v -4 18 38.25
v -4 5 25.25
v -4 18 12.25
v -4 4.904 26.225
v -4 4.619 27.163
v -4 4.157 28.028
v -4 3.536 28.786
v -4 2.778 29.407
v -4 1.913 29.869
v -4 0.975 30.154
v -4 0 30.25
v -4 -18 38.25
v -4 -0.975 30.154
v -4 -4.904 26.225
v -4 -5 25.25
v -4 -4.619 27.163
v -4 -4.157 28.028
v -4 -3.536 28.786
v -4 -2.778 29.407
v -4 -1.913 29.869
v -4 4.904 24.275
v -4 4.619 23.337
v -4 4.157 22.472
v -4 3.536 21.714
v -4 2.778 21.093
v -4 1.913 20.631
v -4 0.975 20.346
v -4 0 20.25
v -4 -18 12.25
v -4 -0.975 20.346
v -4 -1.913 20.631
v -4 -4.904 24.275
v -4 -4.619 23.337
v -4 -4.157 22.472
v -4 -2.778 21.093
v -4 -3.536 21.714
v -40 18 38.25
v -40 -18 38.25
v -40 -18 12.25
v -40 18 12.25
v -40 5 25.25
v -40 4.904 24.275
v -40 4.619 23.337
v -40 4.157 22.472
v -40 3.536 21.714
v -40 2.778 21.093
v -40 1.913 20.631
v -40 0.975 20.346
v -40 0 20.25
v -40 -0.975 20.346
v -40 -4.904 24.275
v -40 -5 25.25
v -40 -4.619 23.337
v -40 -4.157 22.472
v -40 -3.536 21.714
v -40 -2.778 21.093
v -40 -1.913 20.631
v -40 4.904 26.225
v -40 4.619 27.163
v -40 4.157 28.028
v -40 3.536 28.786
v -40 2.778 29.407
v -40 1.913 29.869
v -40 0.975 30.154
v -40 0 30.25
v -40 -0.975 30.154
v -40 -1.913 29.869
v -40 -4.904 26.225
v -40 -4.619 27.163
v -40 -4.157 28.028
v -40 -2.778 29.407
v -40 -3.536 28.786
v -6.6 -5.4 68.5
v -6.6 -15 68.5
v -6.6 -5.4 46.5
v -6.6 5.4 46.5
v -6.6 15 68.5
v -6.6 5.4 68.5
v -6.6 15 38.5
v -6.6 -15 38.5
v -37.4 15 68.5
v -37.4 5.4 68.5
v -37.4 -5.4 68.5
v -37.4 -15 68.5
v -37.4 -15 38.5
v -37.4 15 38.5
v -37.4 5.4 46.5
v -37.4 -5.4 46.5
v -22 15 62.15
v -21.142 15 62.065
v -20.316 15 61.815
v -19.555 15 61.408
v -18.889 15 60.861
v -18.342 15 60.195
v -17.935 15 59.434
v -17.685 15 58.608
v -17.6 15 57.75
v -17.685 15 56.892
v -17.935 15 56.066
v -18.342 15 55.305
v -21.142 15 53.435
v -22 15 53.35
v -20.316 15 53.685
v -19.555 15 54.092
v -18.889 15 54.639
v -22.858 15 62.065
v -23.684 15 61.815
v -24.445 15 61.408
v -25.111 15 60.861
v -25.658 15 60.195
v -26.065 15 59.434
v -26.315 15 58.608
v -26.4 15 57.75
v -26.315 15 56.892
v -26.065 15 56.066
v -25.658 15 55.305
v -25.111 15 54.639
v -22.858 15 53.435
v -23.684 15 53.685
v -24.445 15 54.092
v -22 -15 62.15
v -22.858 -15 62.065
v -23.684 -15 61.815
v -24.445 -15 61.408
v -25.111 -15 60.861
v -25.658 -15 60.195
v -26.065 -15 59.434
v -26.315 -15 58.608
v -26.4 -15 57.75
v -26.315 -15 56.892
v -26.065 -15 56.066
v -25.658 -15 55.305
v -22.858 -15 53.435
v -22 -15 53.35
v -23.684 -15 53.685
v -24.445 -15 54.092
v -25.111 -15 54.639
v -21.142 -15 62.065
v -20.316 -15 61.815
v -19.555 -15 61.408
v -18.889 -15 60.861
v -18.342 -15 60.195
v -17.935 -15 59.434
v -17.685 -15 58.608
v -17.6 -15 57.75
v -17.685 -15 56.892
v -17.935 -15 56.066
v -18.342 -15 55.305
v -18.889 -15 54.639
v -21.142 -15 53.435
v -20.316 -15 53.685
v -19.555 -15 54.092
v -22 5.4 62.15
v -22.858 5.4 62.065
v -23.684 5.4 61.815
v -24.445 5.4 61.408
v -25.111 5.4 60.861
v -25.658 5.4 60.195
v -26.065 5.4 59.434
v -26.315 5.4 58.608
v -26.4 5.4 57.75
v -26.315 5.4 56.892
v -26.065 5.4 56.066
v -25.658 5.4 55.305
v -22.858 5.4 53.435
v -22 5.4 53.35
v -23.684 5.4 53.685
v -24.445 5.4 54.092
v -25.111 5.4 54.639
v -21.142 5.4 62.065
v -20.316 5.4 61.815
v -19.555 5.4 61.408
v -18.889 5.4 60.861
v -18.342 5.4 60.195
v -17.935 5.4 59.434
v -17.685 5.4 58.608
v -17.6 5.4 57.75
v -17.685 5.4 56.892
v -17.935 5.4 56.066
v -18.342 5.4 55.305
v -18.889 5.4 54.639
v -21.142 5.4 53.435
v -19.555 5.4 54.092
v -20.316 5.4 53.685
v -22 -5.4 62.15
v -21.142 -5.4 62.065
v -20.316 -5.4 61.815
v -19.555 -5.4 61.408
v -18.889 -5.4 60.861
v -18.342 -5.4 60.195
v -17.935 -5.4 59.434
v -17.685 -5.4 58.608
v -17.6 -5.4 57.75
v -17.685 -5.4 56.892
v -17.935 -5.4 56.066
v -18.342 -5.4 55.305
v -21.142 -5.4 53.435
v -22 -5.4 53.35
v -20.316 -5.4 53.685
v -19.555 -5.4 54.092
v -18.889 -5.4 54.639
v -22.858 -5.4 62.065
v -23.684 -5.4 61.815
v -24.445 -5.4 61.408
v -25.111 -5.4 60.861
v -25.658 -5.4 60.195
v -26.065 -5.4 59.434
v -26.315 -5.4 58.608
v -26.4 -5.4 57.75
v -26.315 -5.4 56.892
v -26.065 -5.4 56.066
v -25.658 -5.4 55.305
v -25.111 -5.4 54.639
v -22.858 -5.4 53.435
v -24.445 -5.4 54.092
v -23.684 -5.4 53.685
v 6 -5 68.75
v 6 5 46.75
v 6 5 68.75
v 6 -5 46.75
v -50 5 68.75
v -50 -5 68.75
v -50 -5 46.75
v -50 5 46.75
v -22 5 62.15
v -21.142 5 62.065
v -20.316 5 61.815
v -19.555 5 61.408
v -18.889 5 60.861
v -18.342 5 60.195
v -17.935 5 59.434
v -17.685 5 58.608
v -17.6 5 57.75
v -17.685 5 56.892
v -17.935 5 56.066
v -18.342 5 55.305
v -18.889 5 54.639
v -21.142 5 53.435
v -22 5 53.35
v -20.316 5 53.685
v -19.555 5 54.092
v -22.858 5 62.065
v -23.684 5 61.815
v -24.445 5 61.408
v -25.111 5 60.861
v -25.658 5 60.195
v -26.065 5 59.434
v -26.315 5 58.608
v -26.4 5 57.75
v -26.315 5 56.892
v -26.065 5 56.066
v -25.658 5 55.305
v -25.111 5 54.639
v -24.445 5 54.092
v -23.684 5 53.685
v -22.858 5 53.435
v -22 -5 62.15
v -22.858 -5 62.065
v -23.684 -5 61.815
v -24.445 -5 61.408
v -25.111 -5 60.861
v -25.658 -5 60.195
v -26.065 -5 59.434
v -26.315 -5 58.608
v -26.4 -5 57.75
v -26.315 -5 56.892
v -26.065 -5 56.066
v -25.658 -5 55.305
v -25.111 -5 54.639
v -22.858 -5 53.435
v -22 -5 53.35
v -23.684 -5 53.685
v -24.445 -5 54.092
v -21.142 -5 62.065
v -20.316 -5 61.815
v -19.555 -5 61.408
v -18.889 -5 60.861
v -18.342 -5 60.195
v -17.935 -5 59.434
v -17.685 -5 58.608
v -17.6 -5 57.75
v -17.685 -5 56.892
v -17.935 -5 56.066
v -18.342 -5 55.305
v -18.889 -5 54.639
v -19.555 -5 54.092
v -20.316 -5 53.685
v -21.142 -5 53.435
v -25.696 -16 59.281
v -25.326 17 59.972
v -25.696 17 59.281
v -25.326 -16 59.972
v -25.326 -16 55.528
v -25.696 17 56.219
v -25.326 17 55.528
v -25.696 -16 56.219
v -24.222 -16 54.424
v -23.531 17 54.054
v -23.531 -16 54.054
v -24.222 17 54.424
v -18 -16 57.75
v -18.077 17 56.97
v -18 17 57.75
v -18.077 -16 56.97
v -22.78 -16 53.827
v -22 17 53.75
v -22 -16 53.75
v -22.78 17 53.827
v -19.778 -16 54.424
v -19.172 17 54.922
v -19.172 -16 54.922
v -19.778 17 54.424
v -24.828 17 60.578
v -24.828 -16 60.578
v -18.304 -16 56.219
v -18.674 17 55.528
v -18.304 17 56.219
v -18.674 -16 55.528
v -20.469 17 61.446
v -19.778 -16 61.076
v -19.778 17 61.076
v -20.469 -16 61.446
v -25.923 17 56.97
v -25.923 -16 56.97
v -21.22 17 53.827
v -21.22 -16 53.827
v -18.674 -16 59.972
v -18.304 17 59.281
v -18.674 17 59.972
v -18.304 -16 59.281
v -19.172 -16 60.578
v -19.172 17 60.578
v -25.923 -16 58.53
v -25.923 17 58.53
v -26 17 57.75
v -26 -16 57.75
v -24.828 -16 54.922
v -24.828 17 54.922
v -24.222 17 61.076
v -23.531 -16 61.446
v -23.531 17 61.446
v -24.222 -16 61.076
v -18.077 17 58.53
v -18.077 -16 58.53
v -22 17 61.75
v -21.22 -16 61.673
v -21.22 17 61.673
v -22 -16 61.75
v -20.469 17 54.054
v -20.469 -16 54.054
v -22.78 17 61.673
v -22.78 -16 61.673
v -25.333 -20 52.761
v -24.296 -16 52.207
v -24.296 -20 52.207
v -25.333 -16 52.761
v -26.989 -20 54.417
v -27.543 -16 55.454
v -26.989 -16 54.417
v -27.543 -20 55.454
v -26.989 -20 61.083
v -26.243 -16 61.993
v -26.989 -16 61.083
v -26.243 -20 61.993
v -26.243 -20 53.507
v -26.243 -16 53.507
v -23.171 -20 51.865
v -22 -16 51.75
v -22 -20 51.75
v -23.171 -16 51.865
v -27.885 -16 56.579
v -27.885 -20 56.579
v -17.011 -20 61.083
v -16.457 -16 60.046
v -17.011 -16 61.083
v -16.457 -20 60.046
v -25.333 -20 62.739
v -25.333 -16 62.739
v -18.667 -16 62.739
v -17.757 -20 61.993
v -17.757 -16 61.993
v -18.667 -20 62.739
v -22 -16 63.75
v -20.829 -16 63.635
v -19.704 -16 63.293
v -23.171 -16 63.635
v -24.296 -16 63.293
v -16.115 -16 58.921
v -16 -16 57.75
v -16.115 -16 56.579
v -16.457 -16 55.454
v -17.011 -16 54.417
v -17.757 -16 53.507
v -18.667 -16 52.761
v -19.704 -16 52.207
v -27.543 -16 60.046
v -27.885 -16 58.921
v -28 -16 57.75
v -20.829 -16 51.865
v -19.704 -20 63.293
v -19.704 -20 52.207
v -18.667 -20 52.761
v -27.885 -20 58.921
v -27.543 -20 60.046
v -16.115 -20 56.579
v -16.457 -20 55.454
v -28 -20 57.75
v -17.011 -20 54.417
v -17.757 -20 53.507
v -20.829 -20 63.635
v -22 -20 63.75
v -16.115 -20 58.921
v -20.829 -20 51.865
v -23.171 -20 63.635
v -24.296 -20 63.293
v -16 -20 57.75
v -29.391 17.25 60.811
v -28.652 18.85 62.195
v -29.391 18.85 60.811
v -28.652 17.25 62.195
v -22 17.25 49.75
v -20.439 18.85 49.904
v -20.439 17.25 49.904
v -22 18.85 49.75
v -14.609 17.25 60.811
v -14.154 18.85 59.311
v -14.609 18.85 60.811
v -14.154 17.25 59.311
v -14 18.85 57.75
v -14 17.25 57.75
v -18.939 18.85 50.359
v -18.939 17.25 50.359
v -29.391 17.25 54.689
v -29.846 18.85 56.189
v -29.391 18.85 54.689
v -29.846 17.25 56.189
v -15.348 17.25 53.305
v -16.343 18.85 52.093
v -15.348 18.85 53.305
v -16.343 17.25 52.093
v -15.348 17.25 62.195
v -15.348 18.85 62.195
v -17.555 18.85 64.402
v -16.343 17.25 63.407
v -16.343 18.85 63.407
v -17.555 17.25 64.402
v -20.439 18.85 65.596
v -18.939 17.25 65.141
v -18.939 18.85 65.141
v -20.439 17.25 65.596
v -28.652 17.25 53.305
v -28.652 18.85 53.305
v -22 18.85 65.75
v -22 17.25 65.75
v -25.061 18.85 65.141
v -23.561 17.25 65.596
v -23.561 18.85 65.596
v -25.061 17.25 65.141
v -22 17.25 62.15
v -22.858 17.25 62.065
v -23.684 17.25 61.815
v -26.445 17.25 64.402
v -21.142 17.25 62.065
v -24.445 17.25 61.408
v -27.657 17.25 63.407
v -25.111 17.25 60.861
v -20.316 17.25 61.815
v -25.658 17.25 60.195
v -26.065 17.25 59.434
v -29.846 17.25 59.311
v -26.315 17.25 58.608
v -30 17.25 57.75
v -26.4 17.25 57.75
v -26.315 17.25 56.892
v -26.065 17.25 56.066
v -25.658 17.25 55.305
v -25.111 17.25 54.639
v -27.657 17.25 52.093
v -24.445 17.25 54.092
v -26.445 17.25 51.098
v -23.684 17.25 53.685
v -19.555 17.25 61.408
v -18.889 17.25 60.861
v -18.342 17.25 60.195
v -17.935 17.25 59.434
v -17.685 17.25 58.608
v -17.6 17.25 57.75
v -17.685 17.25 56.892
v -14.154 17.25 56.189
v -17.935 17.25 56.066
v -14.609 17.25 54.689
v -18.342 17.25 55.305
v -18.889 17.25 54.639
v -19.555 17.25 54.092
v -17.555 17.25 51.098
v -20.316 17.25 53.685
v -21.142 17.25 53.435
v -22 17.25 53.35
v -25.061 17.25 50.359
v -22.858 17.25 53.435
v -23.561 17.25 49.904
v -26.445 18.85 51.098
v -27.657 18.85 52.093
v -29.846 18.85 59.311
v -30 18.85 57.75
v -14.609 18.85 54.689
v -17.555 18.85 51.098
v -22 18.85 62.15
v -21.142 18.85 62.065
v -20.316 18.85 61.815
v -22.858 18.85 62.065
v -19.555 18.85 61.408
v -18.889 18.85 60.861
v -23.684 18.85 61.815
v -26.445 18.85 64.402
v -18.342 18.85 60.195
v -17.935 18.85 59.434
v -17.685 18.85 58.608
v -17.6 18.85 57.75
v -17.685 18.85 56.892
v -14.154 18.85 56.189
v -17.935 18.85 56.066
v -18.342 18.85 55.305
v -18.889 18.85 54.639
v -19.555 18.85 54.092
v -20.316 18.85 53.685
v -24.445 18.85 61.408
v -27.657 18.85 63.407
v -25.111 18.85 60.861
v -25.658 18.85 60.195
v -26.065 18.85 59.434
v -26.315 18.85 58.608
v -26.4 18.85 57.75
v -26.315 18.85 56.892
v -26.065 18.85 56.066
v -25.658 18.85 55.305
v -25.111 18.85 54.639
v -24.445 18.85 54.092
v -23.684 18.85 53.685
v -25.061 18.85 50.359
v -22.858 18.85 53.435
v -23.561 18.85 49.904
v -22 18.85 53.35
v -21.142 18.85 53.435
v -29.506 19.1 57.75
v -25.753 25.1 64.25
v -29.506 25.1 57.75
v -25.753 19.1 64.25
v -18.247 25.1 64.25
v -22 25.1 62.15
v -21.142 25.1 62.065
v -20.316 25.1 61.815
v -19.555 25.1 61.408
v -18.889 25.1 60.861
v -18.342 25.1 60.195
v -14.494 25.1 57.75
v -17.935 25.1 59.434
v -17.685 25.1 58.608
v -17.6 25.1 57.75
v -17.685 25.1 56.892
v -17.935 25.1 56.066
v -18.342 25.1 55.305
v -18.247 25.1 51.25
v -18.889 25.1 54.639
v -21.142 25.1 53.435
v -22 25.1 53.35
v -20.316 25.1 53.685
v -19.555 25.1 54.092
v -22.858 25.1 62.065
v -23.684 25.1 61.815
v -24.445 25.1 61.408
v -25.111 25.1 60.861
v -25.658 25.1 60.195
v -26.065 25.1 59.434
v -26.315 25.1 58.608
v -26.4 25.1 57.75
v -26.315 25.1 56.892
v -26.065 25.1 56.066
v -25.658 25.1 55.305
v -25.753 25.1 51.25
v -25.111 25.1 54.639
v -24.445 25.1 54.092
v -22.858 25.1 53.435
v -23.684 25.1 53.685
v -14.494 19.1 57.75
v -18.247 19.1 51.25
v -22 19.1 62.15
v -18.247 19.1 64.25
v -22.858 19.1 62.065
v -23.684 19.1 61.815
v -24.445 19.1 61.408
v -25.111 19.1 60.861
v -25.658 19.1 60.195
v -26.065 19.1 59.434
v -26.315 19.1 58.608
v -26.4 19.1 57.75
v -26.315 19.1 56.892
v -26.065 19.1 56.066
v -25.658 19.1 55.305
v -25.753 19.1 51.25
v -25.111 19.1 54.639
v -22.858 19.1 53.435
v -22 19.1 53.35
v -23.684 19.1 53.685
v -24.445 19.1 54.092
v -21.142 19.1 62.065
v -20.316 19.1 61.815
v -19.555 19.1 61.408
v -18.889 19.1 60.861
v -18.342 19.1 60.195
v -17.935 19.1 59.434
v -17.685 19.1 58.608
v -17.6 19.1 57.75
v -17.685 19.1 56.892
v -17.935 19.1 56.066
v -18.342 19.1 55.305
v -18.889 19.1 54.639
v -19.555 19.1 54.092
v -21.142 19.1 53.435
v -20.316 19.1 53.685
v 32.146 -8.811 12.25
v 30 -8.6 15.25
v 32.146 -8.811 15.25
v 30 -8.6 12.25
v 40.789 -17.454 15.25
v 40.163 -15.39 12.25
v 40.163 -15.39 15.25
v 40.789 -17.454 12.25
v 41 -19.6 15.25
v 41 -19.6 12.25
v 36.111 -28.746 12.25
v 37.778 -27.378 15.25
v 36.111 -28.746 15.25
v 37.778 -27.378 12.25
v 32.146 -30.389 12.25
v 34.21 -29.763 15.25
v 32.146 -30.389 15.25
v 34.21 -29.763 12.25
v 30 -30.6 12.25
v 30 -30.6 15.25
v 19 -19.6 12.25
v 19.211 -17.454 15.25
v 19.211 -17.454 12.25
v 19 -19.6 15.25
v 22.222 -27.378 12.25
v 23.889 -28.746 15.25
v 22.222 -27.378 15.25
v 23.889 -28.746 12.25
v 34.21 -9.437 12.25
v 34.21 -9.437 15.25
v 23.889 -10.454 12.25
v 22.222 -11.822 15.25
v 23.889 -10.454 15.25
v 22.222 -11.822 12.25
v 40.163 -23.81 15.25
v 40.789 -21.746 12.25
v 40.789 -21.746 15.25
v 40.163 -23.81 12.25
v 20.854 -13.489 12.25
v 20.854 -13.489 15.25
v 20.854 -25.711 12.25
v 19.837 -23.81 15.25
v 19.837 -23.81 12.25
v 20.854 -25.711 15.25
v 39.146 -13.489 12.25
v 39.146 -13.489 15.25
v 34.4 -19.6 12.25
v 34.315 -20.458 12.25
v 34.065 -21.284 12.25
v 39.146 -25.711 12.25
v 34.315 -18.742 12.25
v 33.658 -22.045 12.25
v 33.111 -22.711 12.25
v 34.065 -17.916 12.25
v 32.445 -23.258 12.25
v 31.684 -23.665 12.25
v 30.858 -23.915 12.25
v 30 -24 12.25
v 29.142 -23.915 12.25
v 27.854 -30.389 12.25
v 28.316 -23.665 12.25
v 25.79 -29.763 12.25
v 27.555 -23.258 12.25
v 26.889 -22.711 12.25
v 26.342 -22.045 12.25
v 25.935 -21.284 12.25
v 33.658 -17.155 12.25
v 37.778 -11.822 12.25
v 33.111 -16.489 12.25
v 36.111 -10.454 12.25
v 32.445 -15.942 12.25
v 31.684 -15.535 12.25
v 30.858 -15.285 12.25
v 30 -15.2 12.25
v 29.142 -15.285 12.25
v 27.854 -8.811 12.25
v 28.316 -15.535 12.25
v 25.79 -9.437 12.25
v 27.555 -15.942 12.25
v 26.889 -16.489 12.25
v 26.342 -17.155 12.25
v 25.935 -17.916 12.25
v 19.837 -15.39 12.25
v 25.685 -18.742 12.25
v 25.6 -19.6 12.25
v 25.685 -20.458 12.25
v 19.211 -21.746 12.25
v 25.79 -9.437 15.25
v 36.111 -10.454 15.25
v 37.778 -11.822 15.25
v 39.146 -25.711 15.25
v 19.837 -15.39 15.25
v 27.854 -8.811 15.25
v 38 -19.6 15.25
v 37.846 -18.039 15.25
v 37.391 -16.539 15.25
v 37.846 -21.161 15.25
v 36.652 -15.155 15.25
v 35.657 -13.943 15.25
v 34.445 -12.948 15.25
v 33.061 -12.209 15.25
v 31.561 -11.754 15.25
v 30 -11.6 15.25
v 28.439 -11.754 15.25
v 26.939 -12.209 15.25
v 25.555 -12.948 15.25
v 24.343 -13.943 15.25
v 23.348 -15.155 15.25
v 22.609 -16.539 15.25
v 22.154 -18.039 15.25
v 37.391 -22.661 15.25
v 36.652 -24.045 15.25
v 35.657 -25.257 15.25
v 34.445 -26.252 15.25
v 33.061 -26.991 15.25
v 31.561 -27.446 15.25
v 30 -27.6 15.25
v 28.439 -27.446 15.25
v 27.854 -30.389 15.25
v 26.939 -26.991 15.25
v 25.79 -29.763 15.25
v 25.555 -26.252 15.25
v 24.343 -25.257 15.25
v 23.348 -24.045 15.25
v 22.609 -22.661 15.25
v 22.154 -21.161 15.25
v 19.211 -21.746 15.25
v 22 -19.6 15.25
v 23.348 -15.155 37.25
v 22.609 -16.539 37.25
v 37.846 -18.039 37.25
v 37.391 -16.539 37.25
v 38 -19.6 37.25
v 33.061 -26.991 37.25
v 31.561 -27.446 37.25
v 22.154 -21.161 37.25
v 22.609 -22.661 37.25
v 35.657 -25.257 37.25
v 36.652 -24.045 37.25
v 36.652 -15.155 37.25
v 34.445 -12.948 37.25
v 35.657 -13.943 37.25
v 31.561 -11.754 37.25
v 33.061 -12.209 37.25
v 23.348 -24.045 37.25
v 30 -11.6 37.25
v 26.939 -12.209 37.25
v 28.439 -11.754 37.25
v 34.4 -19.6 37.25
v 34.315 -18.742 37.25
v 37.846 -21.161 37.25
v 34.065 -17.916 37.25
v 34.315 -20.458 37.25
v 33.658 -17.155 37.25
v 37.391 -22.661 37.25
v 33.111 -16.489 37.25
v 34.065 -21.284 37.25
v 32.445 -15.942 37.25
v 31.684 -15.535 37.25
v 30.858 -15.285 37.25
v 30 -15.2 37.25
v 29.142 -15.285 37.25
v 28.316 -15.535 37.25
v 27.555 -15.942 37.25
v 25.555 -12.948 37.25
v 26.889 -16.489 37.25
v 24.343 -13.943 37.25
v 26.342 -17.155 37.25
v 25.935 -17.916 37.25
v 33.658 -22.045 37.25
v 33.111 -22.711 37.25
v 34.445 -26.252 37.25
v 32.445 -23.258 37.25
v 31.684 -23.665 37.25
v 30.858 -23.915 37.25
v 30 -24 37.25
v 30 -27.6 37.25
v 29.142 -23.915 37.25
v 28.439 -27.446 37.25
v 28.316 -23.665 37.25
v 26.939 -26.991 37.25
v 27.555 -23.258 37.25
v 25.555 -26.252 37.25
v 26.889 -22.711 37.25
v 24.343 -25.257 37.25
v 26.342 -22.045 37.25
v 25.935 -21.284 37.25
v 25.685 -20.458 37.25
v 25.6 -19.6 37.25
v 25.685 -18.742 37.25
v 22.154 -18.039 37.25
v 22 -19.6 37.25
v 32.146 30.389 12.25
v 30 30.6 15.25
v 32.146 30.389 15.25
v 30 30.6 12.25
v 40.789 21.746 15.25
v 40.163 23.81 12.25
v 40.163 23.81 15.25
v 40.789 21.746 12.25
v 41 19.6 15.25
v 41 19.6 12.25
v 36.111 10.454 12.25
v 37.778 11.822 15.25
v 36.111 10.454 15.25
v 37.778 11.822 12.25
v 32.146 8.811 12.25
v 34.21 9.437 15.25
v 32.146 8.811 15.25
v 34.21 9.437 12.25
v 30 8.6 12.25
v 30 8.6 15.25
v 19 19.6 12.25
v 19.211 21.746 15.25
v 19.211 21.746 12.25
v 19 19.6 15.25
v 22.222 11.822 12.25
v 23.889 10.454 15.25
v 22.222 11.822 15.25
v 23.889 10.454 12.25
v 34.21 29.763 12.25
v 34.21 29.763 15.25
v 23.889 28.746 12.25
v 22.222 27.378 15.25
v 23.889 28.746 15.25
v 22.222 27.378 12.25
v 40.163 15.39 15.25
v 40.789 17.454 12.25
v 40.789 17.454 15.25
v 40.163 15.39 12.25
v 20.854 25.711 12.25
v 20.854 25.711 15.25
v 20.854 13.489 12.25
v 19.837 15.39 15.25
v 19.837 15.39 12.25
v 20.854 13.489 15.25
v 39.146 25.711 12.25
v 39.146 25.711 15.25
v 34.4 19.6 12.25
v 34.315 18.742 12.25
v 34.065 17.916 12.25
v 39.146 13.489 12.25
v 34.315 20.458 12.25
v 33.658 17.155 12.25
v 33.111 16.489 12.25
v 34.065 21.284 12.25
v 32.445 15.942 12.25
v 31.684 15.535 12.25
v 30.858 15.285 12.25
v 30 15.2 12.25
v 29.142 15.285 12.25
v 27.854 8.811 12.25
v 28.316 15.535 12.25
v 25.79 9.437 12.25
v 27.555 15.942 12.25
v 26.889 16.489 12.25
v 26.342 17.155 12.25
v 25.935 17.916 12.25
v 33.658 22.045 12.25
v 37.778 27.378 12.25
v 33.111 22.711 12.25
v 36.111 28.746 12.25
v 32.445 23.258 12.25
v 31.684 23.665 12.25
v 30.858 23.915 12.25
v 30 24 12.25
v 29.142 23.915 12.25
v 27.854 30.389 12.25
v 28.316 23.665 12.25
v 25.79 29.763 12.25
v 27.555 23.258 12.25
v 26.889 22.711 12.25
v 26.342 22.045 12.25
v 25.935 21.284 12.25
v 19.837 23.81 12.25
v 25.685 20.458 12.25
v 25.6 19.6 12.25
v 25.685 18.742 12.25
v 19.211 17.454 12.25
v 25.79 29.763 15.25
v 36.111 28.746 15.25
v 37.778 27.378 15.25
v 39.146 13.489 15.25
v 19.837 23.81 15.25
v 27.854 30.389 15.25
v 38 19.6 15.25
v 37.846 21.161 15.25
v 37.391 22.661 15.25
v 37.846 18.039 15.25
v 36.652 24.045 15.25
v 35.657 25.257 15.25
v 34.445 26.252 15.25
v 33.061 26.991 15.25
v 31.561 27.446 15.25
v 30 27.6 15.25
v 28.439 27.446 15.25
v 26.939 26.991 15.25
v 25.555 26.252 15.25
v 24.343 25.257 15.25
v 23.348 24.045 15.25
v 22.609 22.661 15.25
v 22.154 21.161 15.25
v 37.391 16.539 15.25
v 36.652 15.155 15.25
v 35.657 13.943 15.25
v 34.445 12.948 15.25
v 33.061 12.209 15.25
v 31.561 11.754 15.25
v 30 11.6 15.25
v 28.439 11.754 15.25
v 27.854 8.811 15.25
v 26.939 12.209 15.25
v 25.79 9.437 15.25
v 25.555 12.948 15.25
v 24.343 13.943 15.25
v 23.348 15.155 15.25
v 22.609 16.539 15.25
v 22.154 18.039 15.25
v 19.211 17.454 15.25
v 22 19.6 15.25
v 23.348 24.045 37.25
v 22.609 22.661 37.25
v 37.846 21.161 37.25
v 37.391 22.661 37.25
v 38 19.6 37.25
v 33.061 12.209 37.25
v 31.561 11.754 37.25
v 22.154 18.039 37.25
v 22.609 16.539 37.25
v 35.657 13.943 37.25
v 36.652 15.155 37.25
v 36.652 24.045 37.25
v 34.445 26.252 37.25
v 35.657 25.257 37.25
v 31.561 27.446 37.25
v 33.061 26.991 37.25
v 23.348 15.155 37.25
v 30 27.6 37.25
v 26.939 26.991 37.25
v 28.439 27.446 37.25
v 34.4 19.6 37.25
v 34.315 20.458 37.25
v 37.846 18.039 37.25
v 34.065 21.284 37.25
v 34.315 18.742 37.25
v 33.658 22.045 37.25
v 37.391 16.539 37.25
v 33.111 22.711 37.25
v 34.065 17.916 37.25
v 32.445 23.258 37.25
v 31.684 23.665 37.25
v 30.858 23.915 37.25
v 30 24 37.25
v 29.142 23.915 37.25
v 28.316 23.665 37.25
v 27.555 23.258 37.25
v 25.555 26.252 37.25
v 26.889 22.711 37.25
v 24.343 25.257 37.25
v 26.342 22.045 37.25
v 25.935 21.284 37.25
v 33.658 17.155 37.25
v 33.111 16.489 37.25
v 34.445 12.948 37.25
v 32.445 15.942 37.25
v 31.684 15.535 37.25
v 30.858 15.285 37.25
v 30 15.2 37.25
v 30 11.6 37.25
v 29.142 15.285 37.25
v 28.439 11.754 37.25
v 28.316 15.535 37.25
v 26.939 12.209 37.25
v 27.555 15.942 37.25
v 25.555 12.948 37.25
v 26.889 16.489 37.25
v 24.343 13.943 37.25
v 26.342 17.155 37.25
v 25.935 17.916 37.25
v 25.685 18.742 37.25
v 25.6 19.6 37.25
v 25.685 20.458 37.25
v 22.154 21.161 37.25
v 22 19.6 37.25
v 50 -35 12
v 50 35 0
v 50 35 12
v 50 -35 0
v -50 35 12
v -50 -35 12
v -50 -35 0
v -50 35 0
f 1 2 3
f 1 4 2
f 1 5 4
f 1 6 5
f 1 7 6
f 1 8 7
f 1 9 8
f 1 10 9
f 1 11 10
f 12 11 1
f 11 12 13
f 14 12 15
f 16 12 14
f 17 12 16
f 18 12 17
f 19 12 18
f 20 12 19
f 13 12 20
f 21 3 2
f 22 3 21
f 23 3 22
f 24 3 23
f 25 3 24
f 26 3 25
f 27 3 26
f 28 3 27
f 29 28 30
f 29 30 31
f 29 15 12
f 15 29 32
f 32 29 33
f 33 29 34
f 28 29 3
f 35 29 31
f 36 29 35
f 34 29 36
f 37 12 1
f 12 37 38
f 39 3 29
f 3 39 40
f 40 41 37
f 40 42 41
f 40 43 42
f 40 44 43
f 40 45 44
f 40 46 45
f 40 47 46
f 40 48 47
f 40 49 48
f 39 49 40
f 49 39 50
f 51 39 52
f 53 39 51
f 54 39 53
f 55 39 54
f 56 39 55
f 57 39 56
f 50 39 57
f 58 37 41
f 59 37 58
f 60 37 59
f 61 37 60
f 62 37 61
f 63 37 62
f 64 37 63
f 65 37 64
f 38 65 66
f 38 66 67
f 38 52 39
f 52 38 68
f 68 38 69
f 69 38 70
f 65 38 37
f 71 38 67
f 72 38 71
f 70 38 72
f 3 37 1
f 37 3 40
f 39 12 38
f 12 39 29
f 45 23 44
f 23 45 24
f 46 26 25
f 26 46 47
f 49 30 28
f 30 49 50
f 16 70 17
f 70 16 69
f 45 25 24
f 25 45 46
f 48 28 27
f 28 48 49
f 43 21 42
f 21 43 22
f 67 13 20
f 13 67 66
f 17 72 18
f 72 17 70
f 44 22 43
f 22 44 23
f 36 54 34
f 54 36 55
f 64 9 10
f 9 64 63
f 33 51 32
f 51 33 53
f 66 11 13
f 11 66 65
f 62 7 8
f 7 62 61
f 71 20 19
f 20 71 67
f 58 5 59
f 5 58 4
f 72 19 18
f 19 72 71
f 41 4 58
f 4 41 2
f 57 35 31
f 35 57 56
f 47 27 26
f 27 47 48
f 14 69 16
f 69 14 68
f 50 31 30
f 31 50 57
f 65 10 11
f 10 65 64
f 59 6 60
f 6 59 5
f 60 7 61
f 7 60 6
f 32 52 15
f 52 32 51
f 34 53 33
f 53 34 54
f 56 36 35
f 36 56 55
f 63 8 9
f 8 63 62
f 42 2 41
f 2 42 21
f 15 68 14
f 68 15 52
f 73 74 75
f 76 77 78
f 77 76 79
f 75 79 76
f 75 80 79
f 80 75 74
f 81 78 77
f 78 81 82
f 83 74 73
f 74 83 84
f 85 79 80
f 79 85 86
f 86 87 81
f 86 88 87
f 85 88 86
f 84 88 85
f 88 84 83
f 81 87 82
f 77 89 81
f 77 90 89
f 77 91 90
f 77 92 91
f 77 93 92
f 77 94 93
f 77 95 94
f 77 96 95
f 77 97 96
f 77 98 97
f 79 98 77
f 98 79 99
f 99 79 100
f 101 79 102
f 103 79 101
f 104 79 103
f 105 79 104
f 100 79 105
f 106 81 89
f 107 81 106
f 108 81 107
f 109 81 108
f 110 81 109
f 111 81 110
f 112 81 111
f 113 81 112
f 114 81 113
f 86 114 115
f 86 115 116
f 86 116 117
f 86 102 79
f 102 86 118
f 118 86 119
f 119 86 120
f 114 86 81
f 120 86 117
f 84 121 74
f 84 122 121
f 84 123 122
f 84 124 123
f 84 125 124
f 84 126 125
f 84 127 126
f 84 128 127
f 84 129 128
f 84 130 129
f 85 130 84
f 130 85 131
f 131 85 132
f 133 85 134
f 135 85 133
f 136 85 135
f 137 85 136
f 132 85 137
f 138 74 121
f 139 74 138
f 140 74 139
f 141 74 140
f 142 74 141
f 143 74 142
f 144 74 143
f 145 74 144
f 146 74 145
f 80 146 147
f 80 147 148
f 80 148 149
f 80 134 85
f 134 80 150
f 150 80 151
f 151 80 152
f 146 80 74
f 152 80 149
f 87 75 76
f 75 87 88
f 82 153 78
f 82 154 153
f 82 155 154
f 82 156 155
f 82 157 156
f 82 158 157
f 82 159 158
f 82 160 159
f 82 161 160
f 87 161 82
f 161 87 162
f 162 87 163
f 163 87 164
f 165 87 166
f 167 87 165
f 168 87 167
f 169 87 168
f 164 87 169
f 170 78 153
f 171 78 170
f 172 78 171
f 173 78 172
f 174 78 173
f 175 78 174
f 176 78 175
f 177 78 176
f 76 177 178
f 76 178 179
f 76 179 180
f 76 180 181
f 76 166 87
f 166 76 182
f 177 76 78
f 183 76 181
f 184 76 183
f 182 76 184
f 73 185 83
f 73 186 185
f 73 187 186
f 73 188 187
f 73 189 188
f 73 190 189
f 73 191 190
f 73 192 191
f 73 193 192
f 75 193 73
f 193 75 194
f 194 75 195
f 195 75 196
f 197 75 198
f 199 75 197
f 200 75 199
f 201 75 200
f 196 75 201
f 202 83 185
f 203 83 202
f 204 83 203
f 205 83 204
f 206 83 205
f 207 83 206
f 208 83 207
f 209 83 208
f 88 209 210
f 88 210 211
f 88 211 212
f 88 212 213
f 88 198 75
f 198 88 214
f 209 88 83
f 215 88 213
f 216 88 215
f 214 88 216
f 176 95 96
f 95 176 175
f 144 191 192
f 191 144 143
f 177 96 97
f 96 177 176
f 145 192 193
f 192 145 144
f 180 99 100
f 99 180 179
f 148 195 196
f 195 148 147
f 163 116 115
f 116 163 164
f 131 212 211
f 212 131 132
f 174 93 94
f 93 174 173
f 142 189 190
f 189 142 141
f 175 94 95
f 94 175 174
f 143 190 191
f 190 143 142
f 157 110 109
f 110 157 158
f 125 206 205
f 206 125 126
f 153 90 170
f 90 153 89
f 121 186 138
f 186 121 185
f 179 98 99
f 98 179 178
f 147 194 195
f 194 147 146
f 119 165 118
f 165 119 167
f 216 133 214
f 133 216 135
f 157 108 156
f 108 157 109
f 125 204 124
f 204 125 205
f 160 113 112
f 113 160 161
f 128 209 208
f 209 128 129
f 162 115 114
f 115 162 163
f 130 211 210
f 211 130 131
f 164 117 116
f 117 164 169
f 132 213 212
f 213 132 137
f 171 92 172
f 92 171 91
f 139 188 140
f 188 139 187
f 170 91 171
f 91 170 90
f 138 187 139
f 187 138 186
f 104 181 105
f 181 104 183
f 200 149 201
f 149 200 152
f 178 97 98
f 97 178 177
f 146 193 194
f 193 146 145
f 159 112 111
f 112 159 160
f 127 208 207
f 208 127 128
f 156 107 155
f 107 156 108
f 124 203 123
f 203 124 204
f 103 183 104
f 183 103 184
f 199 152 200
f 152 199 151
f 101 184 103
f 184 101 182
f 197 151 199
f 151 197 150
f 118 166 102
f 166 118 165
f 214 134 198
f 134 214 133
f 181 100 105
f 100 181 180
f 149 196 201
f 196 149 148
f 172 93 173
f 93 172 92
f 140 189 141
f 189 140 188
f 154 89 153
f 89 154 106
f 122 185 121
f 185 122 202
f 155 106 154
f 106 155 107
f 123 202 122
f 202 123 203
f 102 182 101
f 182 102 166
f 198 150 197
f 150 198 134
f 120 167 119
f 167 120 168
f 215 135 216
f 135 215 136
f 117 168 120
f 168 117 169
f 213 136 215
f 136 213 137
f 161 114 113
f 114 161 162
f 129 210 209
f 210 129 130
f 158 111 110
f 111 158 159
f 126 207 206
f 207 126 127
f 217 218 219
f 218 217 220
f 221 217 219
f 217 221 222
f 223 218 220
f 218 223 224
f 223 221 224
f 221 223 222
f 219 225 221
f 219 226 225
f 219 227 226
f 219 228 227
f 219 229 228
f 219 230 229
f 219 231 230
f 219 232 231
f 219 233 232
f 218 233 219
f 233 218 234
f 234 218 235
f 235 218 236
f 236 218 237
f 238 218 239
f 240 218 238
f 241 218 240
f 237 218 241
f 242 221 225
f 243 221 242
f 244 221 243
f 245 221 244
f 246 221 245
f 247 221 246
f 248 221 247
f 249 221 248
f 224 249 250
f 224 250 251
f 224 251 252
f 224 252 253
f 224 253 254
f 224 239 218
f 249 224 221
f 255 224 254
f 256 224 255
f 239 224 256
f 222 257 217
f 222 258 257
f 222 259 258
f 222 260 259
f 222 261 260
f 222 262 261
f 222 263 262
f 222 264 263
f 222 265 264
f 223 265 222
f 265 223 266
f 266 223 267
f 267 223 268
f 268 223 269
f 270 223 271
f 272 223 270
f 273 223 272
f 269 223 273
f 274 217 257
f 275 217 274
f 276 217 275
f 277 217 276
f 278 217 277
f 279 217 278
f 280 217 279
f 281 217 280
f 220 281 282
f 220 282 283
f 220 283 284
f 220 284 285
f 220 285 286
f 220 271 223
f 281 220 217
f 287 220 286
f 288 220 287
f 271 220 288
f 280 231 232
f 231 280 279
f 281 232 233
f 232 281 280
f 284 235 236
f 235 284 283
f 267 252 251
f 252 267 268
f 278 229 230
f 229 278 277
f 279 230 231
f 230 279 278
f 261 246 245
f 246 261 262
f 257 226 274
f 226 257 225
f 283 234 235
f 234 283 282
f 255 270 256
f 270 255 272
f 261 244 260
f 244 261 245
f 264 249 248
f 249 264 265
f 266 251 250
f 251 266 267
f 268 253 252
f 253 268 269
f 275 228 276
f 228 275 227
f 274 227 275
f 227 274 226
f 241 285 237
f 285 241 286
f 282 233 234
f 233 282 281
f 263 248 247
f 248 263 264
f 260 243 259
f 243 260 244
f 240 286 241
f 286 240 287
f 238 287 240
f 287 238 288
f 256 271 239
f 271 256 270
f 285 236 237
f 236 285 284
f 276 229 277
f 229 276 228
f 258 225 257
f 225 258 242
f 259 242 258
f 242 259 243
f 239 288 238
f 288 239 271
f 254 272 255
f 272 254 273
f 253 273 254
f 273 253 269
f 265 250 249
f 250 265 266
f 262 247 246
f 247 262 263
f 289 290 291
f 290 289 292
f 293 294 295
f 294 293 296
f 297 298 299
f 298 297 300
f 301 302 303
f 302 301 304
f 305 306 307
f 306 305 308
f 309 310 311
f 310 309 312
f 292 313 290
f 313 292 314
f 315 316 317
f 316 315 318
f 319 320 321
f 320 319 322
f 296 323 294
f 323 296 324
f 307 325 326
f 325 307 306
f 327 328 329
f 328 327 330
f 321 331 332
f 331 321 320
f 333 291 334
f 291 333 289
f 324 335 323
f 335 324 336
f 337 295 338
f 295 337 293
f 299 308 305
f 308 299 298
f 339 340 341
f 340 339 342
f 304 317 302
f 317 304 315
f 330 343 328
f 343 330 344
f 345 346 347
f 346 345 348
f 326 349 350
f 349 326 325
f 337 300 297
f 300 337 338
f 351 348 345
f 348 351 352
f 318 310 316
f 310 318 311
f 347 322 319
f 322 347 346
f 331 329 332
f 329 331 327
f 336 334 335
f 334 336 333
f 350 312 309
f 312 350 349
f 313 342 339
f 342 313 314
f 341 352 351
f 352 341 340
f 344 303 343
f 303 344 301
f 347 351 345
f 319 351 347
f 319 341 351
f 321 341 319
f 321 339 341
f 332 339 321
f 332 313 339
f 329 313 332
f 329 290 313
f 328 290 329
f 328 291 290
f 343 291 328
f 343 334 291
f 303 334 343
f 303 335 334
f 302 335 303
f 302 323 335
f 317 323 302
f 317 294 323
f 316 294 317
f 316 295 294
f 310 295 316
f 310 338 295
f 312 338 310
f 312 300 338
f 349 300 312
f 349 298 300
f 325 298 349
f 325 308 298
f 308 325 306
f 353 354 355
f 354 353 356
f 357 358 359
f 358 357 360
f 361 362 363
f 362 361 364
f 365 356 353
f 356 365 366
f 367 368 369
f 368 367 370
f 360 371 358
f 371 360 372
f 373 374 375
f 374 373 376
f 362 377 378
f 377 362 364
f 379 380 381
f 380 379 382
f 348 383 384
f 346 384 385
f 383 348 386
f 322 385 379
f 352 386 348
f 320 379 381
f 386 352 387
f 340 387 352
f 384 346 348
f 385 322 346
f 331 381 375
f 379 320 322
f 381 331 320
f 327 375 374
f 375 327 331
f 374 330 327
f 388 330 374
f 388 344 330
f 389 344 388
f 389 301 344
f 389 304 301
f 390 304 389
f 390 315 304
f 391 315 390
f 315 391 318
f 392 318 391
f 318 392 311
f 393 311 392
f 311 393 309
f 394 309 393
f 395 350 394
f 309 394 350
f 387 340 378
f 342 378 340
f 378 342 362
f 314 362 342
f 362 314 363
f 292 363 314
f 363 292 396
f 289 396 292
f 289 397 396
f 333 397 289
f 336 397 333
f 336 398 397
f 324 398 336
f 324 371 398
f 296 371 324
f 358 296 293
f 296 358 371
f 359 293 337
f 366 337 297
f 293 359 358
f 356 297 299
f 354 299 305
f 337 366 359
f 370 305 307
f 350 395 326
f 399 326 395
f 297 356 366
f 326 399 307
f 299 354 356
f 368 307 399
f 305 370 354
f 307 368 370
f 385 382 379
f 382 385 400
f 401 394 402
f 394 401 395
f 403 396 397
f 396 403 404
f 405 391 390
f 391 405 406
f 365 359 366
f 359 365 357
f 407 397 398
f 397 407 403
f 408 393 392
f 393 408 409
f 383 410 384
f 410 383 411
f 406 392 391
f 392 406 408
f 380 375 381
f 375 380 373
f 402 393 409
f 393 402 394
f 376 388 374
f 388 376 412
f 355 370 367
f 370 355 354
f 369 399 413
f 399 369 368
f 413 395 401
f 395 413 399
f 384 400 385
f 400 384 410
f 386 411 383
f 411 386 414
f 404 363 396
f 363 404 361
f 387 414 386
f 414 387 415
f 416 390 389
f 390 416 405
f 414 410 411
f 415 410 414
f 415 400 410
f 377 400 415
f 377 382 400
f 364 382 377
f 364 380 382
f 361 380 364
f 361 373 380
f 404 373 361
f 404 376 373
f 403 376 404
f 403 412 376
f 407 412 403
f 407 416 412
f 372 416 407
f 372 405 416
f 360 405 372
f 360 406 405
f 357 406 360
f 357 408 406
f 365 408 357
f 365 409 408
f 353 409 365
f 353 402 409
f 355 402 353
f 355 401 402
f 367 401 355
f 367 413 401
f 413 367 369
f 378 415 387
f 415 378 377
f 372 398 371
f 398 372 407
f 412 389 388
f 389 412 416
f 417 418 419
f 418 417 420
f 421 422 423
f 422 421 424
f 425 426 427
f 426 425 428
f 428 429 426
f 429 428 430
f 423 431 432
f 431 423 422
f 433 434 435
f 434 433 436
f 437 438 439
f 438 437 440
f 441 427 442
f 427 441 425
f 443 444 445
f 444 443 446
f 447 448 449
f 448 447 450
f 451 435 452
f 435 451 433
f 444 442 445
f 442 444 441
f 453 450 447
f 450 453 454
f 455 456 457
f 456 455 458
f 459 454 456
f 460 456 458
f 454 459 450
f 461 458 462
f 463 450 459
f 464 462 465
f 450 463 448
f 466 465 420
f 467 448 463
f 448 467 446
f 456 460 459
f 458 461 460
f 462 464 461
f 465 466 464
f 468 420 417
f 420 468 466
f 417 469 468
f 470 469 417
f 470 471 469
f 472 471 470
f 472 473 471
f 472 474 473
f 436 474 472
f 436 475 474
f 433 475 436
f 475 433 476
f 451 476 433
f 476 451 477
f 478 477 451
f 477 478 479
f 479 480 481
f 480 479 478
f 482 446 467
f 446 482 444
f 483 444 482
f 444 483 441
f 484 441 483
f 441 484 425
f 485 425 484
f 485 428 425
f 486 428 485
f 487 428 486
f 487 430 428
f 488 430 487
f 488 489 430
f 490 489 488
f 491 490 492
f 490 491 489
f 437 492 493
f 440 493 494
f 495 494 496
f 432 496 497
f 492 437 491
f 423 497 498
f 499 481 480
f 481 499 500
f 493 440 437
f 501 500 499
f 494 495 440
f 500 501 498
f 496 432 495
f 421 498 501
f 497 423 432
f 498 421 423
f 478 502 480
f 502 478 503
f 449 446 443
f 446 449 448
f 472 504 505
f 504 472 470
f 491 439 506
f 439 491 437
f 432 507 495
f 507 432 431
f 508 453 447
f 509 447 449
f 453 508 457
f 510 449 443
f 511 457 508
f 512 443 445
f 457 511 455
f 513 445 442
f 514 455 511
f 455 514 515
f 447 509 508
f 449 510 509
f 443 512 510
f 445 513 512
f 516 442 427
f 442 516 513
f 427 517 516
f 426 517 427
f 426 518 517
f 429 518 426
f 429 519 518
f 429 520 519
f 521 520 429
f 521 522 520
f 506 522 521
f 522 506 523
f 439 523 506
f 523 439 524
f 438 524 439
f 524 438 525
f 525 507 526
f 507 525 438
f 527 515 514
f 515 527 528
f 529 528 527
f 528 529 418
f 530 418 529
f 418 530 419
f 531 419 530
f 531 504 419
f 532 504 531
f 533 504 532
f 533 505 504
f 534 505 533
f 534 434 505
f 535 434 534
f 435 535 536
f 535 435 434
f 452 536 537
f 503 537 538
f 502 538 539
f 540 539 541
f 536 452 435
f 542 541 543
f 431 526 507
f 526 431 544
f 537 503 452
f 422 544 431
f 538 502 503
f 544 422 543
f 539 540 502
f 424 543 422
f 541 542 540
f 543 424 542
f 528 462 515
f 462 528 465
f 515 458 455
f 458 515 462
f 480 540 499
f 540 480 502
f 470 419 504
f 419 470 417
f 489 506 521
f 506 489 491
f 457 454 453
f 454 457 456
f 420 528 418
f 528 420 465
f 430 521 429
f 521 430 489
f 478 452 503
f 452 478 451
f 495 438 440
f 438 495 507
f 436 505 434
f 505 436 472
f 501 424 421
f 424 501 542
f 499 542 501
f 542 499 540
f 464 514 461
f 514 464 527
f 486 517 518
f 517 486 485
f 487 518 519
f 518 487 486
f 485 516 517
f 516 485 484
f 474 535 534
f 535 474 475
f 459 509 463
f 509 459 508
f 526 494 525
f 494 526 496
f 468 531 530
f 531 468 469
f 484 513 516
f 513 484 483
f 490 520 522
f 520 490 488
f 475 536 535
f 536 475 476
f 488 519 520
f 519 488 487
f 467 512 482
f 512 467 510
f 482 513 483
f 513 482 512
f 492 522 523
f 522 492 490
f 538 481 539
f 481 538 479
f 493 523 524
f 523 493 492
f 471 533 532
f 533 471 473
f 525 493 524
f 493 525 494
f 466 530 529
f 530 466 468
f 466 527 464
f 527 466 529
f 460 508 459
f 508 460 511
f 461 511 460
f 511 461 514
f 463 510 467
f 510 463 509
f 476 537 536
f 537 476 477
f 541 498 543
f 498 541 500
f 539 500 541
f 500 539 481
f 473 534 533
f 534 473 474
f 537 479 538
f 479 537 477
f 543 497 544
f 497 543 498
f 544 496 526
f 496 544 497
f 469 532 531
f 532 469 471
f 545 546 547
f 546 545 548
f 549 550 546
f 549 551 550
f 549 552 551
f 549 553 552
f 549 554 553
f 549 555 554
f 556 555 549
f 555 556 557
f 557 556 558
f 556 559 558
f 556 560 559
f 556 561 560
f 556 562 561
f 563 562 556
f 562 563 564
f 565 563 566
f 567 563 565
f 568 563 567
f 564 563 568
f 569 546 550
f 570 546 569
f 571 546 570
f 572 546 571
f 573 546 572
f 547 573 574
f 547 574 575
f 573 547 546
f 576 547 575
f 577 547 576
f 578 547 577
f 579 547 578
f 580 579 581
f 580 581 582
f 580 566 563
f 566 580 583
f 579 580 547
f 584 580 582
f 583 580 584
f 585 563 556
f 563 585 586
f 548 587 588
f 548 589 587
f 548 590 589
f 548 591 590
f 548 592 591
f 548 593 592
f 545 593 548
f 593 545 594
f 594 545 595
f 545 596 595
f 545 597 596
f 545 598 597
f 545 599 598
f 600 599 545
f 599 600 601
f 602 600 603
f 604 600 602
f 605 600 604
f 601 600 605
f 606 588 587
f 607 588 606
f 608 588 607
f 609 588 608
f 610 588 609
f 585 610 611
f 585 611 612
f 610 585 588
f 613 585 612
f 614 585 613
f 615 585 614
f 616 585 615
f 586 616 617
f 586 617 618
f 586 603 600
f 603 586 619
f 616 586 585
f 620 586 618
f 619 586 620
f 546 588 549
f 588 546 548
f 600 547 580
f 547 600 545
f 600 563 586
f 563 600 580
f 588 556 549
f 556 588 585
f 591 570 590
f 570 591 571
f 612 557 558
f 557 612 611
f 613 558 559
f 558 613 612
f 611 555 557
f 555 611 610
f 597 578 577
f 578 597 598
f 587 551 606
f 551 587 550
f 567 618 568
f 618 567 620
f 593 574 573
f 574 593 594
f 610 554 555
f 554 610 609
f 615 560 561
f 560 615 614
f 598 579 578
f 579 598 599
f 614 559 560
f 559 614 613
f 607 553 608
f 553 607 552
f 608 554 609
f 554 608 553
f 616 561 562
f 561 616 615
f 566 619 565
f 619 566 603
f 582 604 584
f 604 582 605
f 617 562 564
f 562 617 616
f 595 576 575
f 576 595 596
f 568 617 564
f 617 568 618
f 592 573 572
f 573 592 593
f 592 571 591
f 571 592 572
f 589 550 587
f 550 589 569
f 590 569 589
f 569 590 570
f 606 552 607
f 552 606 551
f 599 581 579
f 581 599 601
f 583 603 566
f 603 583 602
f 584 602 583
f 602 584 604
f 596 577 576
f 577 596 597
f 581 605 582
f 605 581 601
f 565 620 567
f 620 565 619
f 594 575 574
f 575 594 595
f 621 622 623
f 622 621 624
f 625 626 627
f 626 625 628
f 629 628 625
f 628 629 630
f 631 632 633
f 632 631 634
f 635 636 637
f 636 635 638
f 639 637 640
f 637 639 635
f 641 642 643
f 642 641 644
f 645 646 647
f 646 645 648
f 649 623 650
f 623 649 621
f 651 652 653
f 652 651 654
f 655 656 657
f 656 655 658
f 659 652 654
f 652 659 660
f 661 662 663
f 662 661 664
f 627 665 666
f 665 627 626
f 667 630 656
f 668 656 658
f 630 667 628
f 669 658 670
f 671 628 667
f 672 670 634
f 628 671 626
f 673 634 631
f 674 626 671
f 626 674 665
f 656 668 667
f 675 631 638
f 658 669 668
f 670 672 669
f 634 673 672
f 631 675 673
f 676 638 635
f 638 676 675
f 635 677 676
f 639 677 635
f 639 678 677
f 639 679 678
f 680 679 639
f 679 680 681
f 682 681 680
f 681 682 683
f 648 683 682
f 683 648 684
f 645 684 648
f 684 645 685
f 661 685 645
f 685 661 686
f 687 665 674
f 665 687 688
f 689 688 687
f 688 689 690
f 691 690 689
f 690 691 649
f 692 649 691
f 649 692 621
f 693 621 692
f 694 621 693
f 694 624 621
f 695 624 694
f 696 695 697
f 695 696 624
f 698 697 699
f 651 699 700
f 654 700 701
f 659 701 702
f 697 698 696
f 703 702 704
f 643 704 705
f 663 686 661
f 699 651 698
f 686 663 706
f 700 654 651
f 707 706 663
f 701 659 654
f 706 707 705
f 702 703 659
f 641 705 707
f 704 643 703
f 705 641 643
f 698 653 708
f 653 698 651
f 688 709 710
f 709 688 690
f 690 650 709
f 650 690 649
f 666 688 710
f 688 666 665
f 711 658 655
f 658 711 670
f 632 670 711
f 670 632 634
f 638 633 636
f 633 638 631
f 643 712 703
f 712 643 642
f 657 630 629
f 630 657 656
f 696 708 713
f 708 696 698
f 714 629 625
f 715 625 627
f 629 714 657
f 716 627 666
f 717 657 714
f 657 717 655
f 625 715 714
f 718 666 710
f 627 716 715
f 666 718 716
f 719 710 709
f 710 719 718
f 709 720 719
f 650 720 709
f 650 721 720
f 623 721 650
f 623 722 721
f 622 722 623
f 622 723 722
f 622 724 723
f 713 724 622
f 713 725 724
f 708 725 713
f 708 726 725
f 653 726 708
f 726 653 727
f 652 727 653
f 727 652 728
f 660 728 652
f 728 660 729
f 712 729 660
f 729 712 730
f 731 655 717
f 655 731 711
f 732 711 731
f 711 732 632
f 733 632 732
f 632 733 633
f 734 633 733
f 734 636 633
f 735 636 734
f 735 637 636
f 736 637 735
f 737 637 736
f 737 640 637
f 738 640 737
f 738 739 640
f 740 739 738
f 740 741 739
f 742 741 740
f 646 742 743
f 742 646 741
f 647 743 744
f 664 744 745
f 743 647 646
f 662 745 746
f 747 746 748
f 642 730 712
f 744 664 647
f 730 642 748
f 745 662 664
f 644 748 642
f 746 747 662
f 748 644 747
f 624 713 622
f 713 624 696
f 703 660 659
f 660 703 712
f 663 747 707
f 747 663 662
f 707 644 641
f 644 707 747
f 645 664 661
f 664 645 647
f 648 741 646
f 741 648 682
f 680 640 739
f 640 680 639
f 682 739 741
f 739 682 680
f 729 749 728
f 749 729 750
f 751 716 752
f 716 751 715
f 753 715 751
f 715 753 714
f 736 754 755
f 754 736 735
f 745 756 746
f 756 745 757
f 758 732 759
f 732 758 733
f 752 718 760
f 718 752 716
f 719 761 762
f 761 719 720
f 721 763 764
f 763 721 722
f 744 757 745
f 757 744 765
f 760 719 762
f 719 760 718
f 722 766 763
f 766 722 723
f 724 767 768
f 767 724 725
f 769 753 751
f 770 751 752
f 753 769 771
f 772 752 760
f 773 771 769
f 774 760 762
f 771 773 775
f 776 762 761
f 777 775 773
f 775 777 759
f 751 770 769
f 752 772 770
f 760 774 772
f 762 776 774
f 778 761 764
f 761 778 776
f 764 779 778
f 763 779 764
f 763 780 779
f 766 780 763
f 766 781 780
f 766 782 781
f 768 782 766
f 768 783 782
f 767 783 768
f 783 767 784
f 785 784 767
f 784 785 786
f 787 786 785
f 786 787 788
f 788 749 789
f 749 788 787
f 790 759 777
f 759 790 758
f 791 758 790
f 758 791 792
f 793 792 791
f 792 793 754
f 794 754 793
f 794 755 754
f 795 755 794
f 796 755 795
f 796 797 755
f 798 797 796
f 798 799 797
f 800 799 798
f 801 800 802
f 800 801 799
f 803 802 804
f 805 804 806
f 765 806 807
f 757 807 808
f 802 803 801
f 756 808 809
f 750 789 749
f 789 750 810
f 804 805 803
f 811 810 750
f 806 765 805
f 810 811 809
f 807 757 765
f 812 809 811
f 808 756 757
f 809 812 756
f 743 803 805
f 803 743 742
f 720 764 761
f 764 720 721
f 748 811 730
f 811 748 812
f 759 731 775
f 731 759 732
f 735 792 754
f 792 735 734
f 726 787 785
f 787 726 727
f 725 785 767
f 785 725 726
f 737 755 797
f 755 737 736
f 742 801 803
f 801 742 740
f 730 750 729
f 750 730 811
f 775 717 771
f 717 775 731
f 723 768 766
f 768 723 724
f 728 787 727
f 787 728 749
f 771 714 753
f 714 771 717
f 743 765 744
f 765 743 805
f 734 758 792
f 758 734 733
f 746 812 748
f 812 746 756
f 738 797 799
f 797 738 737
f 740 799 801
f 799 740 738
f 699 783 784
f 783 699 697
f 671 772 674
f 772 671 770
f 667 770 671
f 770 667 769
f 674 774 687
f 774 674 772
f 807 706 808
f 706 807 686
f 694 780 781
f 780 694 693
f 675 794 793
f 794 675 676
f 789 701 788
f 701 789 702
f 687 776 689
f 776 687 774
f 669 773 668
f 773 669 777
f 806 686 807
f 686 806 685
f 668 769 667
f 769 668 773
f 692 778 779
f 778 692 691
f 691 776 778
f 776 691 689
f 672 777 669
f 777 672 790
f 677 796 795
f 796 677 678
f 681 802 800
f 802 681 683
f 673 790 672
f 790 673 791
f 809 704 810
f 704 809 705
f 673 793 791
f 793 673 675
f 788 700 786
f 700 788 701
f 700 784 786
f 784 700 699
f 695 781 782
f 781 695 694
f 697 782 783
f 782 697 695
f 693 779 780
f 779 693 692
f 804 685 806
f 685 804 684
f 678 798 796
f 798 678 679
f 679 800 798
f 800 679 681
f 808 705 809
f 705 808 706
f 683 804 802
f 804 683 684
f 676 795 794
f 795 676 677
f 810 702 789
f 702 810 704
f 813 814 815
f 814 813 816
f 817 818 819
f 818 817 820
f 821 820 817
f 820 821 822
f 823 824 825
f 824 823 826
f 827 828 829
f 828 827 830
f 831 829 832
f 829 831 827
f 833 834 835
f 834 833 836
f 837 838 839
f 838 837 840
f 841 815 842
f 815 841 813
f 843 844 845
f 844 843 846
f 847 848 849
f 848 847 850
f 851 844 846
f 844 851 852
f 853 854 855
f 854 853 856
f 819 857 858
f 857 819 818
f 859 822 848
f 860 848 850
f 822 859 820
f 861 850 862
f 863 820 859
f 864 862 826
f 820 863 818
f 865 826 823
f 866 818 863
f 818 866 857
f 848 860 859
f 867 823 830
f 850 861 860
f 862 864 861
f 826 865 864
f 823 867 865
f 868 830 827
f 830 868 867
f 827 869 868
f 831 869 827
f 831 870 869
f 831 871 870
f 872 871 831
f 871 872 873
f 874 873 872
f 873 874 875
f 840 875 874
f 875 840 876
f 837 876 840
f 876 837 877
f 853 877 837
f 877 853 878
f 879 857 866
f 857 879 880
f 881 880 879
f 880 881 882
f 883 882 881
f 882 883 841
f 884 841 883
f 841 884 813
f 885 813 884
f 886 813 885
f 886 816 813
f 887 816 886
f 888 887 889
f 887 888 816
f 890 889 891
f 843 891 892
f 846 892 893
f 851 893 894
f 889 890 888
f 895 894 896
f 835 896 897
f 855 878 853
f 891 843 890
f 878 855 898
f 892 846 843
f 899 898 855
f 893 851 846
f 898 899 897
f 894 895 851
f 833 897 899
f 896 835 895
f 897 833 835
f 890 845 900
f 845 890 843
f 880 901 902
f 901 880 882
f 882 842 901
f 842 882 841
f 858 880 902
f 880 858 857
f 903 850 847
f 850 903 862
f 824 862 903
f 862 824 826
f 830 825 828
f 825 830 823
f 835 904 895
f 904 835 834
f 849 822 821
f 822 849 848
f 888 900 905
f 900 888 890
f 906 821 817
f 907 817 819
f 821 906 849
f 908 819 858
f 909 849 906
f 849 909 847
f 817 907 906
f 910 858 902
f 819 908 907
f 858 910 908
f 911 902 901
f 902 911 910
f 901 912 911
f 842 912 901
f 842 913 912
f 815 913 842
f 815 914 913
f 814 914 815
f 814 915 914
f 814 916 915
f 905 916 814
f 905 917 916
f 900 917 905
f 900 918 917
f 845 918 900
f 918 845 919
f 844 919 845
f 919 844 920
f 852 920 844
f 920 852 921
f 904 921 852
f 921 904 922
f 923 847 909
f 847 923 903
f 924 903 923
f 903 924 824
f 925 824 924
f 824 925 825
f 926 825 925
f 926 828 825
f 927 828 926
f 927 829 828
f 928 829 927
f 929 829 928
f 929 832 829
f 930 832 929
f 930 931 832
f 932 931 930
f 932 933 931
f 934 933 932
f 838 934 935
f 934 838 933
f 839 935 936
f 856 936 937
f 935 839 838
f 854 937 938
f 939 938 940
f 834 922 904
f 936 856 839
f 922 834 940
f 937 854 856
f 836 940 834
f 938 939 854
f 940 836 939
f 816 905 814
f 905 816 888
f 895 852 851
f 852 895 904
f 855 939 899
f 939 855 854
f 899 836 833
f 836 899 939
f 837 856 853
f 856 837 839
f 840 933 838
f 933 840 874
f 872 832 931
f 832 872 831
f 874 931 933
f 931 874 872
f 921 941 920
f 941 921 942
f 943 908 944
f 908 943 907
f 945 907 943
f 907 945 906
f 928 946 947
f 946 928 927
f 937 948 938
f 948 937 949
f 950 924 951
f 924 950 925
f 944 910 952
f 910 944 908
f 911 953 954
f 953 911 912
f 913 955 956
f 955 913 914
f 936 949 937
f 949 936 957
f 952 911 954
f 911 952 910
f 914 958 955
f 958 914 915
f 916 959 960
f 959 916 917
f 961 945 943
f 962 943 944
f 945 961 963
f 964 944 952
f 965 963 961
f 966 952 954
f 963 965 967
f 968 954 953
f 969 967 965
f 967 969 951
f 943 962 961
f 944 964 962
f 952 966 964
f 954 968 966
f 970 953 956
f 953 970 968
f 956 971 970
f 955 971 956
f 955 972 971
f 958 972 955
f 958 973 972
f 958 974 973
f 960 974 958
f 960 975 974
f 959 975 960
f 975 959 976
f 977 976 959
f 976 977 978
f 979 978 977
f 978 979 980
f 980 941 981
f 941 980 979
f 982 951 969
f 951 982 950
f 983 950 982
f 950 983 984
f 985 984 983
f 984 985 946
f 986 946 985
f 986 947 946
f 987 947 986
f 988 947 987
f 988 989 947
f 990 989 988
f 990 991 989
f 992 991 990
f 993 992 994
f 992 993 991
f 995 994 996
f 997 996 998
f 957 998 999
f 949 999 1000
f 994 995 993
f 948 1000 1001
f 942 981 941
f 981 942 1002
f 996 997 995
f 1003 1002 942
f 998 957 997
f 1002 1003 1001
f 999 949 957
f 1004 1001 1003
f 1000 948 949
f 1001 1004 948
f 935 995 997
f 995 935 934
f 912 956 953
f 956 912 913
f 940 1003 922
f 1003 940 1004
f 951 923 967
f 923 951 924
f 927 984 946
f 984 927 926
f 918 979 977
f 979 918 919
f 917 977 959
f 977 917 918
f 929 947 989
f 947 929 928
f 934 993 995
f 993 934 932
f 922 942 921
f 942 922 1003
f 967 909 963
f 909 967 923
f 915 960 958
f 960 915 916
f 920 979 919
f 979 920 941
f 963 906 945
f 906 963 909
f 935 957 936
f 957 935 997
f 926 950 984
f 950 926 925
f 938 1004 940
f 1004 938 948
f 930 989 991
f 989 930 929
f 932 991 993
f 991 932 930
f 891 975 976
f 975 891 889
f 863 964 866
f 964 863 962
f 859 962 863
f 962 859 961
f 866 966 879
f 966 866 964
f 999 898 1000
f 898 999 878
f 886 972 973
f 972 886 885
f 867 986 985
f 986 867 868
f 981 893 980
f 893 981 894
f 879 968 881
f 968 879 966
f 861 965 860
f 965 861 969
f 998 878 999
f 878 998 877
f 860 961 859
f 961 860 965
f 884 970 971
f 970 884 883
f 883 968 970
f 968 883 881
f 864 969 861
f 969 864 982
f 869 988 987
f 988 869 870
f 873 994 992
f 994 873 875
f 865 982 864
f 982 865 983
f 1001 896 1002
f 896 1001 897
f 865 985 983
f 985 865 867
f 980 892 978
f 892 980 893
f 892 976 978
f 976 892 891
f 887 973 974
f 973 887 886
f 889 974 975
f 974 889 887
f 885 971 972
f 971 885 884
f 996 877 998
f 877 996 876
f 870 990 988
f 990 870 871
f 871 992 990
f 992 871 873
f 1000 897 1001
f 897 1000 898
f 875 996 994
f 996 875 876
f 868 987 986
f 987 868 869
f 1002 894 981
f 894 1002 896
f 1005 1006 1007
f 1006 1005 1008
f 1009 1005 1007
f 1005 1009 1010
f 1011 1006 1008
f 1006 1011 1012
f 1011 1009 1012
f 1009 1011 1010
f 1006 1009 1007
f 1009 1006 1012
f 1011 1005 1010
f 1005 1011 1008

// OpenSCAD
$fn = 32;

// ------------------------------------------------------------------------
// Indexing jig: plate 100 x 70 mm, pin d8
// Every part is its own module, assembly() places every instance.
// ------------------------------------------------------------------------

// --- part 1 ---
module jig_plate() {
  difference() {
    translate([-50, -35, 0]) cube([100, 70, 12]);
  }
}

// --- part 2 ---
module locator_block() {
  difference() {
    translate([-18, -18, 0]) cube([36, 36, 26]);
    translate([0, 0, 13]) rotate([0, 90, 0]) cylinder(h = 38, d = 10, center = true);
  }
}

// --- part 3 ---
module index_fork() {
  difference() {
    translate([-15.4, -15, 0]) cube([30.8, 30, 30]);
    translate([-16.4, -5.4, 8]) cube([32.8, 10.8, 23]);
    translate([0, 0, 19.25]) rotate([90, 0, 0]) cylinder(h = 32, d = 8.8, center = true);
  }
}

// --- part 4 ---
module index_arm() {
  difference() {
    translate([-28, -5, 0]) cube([56, 10, 22]);
    translate([0, 0, 11]) rotate([90, 0, 0]) cylinder(h = 12, d = 8.8, center = true);
  }
}

// --- part 5 ---
module index_pin() {
  rotate([0, 90, 0]) cylinder(h = 34, d = 8, center = true);
  translate([-20, 0, 0]) rotate([0, 90, 0]) cylinder(h = 4, d = 12);
}

// --- part 6 ---
module pin_washer() {
  difference() {
      translate([0, 0, 0]) cylinder(h = 1.6, d = 16);
      translate([0, 0, -1]) cylinder(h = 3.6, d = 8.8);
    }
}

// --- part 7 ---
module lock_nut() {
  difference() {
    linear_extrude(height = 6) polygon(points = [[7.506, 0], [3.753, 6.5], [-3.753, 6.5], [-7.506, 0], [-3.753, -6.5], [3.753, -6.5]]);
    translate([0, 0, -1]) cylinder(h = 8, d = 8.8);
  }
}

// --- part 8 ---
module guide_bush_a() {
  difference() {
    union() {
      cylinder(h = 3, d = 22);
      translate([0, 0, 3]) cylinder(h = 22, d = 16);
    }
    translate([0, 0, -1]) cylinder(h = 27, d = 8.8);
  }
}

// --- part 9 ---
module guide_bush_b() {
  difference() {
    union() {
      cylinder(h = 3, d = 22);
      translate([0, 0, 3]) cylinder(h = 22, d = 16);
    }
    translate([0, 0, -1]) cylinder(h = 27, d = 8.8);
  }
}

// --- assembly ---
module assembly() {
  color([0.80, 0.24, 0.20]) translate([0, 0, 0]) rotate([0, 0, 0]) jig_plate();
  color([0.20, 0.45, 0.75]) translate([-22, 0, 12.25]) rotate([0, 0, 0]) locator_block();
  color([0.25, 0.62, 0.32]) translate([-22, 0, 38.5]) rotate([0, 0, 0]) index_fork();
  color([0.92, 0.70, 0.18]) translate([-22, 0, 46.75]) rotate([0, 0, 0]) index_arm();
  color([0.58, 0.35, 0.70]) translate([-22, 0, 57.75]) rotate([0, 0, 90]) index_pin();
  color([0.16, 0.66, 0.66]) translate([-22, 18.85, 57.75]) rotate([90, 0, 0]) pin_washer();
  color([0.85, 0.48, 0.18]) translate([-22, 25.1, 57.75]) rotate([90, 0, 0]) lock_nut();
  color([0.55, 0.60, 0.65]) translate([30, -19.6, 12.25]) rotate([0, 0, 0]) guide_bush_a();
  color([0.75, 0.30, 0.55]) translate([30, 19.6, 12.25]) rotate([0, 0, 0]) guide_bush_b();
}

assembly();
